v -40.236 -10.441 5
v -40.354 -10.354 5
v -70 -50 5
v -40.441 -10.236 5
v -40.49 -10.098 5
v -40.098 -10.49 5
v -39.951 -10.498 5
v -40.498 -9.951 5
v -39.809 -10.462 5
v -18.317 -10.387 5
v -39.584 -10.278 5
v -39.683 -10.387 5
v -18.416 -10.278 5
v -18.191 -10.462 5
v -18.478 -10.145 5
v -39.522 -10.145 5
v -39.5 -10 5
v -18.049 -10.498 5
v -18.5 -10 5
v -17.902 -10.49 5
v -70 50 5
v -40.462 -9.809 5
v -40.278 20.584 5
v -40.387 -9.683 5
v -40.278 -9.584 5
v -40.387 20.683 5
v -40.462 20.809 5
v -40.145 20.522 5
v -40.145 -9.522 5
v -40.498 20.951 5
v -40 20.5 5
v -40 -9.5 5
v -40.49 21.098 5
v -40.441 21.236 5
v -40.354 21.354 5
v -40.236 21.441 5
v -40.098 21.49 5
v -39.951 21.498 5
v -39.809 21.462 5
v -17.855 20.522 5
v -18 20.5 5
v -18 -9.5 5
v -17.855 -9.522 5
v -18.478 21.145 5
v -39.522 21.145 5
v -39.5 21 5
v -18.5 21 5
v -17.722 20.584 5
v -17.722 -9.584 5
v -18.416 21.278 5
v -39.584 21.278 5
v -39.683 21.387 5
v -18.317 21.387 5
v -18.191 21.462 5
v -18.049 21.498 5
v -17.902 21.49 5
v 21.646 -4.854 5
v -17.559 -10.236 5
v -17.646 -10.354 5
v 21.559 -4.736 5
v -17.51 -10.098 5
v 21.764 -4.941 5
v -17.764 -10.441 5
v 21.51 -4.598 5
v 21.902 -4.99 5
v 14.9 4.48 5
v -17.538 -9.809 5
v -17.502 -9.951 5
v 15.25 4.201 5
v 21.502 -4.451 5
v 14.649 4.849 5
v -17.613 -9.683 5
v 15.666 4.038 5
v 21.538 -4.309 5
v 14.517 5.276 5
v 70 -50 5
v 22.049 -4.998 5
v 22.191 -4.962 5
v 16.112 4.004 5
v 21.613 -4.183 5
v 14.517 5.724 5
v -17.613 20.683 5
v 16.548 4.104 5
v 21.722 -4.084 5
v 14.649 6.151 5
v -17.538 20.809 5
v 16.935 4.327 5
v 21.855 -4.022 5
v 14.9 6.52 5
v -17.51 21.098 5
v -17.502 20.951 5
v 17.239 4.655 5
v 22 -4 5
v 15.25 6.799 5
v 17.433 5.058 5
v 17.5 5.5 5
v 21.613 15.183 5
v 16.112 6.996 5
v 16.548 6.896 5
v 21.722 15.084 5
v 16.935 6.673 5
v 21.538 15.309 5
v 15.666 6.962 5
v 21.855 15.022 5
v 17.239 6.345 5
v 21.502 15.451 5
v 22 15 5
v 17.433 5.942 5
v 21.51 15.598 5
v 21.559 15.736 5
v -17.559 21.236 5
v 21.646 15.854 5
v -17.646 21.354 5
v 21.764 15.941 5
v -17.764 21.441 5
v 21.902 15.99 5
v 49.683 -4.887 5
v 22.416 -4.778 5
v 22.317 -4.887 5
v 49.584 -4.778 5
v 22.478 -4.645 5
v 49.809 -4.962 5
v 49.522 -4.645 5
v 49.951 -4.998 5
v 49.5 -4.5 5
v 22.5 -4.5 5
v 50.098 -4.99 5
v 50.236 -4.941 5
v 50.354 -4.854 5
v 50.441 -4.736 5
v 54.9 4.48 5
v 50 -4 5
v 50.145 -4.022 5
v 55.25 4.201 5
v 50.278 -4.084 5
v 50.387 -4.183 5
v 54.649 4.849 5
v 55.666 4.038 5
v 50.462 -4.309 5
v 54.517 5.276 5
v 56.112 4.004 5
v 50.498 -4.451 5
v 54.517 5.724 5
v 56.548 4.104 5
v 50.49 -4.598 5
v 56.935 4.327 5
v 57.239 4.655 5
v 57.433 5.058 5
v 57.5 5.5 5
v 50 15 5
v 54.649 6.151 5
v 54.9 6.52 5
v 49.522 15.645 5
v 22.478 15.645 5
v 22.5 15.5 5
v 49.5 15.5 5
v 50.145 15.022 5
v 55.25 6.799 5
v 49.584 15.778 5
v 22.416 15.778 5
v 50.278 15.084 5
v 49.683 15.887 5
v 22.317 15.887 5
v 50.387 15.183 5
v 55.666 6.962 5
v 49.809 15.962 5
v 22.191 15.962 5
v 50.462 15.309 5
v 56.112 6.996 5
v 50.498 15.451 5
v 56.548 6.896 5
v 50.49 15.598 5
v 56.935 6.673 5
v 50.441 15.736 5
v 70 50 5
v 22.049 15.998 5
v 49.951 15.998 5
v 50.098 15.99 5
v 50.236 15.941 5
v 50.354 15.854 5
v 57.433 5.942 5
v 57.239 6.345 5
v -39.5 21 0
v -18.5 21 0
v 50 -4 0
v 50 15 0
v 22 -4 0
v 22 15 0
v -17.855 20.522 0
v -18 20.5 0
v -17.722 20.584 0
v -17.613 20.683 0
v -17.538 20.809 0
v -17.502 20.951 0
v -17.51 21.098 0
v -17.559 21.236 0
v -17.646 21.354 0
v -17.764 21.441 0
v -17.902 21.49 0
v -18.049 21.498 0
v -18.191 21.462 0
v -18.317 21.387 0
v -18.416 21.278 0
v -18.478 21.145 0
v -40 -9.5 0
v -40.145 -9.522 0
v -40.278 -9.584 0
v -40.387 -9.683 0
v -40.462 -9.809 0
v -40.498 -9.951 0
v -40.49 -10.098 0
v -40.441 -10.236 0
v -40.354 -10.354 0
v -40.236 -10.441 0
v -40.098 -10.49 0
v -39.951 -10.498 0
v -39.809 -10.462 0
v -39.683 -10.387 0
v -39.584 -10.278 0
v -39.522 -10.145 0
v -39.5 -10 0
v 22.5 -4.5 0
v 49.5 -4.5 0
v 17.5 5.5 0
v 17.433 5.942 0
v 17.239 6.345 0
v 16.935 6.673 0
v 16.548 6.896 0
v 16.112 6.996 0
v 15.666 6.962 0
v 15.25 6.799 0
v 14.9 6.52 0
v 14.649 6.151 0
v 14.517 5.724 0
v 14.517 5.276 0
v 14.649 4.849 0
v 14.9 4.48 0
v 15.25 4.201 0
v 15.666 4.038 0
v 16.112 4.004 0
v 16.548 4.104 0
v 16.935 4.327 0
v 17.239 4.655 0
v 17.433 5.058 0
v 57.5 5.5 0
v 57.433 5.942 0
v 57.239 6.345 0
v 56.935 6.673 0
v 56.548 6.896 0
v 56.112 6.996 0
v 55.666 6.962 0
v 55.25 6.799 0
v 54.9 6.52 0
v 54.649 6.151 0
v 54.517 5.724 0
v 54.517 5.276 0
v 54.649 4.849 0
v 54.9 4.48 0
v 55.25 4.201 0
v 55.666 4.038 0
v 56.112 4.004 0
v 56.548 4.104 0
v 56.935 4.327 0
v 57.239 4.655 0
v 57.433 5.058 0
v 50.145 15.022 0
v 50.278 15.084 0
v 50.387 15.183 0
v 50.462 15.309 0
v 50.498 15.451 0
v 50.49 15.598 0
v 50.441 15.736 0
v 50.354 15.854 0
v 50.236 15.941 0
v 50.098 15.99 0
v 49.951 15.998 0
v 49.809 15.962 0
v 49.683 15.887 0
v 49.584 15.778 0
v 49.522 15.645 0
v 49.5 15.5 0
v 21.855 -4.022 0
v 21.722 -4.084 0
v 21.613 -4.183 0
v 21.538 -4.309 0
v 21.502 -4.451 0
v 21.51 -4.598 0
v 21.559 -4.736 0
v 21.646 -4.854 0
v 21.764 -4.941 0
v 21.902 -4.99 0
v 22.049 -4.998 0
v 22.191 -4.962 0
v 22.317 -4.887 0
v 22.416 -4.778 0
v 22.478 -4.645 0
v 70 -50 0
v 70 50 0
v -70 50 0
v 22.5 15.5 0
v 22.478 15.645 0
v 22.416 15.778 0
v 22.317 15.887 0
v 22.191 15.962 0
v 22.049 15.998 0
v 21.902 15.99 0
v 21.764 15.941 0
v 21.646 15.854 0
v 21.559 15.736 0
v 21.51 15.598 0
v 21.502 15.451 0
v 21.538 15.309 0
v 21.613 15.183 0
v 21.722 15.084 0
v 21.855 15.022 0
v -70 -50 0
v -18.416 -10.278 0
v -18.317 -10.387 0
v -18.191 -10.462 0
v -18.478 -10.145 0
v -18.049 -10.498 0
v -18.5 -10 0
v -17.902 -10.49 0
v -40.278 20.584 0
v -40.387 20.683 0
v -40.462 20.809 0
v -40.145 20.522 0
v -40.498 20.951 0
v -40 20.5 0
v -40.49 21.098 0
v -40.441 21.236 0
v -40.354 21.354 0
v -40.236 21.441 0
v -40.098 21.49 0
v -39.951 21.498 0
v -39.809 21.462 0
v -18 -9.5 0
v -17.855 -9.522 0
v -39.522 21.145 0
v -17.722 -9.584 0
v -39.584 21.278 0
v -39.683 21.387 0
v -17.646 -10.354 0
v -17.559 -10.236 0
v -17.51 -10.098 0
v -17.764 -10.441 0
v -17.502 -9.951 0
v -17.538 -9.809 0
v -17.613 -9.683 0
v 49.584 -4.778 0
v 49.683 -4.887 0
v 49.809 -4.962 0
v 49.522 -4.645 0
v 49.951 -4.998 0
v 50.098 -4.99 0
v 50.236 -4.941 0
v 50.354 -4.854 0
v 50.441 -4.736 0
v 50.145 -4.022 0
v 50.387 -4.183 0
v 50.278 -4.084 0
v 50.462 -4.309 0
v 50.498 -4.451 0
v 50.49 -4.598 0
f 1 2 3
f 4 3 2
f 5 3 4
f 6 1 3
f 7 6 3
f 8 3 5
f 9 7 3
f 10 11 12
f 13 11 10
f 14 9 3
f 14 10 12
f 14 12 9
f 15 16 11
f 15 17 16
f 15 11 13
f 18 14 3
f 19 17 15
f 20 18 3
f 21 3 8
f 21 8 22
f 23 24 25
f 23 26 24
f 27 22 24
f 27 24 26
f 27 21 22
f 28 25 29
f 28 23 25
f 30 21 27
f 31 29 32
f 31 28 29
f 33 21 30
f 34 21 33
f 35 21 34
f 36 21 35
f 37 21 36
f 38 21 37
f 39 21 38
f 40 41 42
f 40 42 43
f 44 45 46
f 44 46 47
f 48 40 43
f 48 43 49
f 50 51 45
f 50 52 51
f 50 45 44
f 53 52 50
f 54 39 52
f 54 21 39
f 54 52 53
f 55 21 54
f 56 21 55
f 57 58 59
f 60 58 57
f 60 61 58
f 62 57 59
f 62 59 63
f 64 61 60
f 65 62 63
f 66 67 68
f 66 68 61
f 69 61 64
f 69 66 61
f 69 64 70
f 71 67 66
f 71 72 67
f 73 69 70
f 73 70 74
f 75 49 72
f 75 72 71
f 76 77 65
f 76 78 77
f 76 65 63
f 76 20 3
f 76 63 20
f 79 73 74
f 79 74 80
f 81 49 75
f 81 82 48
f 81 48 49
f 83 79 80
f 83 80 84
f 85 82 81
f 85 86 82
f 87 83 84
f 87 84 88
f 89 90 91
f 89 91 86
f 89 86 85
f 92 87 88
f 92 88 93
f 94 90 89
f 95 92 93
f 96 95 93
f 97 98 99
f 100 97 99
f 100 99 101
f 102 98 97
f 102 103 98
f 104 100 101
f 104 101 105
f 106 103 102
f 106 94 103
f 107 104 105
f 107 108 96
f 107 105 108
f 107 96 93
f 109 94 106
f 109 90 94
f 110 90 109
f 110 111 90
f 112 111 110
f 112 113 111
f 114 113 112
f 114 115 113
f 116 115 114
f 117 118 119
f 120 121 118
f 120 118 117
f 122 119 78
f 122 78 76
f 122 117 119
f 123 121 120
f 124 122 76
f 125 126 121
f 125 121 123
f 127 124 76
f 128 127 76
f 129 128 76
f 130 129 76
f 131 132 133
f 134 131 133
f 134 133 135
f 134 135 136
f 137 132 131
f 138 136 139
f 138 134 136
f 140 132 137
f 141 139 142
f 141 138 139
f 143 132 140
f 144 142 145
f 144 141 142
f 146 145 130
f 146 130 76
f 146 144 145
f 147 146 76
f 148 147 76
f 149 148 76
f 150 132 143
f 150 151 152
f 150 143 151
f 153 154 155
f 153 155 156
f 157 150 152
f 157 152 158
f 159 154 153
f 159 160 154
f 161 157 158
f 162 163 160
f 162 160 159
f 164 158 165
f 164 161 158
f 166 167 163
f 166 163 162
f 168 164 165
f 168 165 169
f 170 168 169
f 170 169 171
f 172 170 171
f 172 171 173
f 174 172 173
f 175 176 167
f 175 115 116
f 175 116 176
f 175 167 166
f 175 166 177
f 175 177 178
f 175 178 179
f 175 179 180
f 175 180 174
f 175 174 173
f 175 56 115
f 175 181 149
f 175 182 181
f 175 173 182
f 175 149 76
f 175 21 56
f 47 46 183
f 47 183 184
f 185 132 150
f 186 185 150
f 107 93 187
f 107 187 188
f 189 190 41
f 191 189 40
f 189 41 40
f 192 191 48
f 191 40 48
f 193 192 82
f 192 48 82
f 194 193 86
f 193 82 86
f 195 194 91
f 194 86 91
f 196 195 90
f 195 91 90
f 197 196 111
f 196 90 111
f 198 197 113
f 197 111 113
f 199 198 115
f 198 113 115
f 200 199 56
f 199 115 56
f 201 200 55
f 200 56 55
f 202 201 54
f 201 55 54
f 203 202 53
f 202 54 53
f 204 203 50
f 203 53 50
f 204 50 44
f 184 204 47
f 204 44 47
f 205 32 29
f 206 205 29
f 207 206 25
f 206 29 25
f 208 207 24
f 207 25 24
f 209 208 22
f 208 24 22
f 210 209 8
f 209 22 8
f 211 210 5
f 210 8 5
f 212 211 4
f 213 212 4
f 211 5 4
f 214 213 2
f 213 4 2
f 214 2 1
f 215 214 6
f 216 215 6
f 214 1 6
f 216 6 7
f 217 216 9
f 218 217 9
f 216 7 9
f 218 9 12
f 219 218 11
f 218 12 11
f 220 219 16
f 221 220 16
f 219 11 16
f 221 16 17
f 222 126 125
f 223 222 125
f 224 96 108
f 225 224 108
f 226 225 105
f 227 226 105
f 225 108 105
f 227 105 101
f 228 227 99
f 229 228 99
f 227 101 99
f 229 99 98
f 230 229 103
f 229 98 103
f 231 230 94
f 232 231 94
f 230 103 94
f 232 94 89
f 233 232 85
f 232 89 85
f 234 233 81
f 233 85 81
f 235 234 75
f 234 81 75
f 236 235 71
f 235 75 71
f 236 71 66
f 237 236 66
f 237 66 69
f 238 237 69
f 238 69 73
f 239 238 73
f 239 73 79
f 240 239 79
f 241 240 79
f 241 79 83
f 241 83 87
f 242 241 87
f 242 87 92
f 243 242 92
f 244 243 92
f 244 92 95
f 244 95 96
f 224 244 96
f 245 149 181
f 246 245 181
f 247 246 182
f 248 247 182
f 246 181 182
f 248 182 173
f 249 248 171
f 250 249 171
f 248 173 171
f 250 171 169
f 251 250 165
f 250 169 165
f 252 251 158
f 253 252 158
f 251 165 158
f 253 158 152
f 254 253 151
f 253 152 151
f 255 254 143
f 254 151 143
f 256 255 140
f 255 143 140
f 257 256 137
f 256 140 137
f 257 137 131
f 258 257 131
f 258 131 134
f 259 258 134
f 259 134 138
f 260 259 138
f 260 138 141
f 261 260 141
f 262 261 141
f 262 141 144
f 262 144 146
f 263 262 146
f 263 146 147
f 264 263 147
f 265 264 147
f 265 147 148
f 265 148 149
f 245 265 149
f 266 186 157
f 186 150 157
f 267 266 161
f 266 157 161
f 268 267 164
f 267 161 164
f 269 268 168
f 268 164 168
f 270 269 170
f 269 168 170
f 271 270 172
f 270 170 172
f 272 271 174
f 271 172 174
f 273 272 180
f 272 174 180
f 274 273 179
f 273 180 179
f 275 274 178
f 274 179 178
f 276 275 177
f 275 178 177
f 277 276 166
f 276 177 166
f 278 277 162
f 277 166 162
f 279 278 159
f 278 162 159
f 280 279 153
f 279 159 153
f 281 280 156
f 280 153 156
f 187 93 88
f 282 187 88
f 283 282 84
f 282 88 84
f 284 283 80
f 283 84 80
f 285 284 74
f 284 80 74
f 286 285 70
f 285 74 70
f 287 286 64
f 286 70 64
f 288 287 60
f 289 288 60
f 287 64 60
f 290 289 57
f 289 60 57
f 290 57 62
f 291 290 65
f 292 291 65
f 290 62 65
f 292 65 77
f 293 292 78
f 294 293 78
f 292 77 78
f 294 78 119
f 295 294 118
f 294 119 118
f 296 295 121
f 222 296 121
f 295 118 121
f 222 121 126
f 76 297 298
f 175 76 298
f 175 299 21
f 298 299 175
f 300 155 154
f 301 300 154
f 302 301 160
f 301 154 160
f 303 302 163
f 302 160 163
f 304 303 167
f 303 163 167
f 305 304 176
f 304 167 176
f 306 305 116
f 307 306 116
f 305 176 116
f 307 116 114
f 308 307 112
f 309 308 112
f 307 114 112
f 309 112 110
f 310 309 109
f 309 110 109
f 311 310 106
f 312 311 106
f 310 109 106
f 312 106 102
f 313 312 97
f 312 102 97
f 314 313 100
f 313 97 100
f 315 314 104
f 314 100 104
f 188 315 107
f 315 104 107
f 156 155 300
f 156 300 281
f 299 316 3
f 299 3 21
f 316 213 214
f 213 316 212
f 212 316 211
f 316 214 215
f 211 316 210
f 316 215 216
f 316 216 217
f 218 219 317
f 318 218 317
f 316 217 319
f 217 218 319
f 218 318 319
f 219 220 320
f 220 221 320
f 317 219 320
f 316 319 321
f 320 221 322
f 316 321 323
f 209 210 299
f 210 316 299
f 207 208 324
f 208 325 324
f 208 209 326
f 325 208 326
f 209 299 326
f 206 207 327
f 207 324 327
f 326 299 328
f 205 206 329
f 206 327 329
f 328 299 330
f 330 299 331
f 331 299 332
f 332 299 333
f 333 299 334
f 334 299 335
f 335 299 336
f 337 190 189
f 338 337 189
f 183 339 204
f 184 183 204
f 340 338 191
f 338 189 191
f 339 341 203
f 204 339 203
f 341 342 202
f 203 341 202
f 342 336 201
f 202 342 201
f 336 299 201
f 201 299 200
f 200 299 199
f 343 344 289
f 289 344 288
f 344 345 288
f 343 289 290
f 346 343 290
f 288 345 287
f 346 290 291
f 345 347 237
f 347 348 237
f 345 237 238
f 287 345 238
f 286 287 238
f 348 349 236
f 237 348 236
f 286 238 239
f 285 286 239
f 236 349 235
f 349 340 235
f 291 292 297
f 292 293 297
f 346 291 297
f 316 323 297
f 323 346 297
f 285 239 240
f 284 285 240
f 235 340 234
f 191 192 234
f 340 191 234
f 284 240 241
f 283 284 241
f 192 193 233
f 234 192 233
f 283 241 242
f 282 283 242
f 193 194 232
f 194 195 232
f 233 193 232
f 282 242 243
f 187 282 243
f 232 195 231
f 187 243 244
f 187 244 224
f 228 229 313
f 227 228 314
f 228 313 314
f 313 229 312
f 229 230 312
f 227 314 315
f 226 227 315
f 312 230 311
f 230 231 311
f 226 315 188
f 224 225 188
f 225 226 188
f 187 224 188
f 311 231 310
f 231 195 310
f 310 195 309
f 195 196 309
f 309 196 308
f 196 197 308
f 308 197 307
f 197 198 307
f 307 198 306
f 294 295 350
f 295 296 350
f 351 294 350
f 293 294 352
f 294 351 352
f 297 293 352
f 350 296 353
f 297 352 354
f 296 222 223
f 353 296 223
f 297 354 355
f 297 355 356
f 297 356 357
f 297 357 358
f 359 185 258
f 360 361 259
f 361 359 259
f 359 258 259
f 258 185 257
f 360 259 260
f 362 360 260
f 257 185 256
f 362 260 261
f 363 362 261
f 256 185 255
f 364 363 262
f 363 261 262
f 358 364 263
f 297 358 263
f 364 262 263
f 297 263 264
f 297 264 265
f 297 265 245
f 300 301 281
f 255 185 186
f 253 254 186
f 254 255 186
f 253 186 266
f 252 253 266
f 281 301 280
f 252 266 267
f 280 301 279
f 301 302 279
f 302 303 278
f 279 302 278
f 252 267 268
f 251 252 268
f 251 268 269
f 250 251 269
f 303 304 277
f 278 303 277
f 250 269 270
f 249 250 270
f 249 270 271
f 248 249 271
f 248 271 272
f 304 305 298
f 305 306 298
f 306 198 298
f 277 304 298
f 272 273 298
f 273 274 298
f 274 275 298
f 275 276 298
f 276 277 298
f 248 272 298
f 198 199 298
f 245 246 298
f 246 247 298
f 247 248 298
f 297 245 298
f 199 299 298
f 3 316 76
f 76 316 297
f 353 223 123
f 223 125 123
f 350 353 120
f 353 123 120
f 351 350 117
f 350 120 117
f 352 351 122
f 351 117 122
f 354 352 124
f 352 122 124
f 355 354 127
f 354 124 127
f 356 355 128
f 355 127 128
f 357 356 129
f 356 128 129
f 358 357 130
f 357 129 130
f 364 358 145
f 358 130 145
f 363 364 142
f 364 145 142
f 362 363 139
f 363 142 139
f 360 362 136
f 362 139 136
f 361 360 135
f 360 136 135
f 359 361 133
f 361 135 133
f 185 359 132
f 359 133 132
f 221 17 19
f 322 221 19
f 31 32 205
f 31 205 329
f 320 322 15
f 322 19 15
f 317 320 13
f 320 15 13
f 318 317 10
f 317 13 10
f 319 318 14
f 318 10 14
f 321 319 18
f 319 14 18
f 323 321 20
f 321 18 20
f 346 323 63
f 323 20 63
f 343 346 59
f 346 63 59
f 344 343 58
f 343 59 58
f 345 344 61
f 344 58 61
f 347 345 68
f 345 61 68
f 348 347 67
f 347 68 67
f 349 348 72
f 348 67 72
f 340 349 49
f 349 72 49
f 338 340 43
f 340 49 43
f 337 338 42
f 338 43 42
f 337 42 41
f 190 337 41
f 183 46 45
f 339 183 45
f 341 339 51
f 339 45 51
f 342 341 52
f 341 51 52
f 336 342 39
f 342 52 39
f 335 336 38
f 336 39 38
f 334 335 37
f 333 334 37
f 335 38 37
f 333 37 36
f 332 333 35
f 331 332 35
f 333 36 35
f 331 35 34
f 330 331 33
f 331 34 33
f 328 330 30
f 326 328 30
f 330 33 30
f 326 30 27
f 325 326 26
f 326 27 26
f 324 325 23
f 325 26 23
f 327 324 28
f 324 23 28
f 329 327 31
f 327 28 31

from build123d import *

# Parameters (mm, degrees)
SKIZZE1_W                       = 140
SKIZZE1_H                       = 100
AUFSATZ_LINEAR_AUSTRAGEN1_DEPTH = 5
SKIZZE2_W                       = 22
SKIZZE2_H                       = 31
SCHNITT_LINEAR_AUSTRAGEN1_DEPTH = 87.168439698
SKIZZE4_R                       = 1.5
SKIZZE4_W                       = 28
SKIZZE4_H                       = 20
SCHNITT_LINEAR_AUSTRAGEN3_DEPTH = 87.168439698
SKIZZE3_R                       = 0.5
SCHNITT_LINEAR_AUSTRAGEN2_DEPTH = 87.168439698


with BuildPart() as part:
    # Skizze1 → Aufsatz-Linear austragen1 (new body)
    with BuildSketch(Plane.XY):
        Rectangle(SKIZZE1_W, SKIZZE1_H)
    extrude(amount=AUFSATZ_LINEAR_AUSTRAGEN1_DEPTH)

    # Skizze2 → Schnitt-Linear austragen1 (cut, through all)
    with BuildSketch(Plane.XY.offset(5)):
        with Locations((-29, 5.5)):
            Rectangle(SKIZZE2_W, SKIZZE2_H)
    extrude(amount=-SCHNITT_LINEAR_AUSTRAGEN1_DEPTH, mode=Mode.SUBTRACT)

    # Skizze4 → Schnitt-Linear austragen3 (cut, through all)
    with BuildSketch(Plane.XY.offset(5)):
        with Locations((16, 5.5)):
            Circle(SKIZZE4_R)
        with Locations((56, 5.5)):
            Circle(SKIZZE4_R)
        with Locations((36, 5.5)):
            Rectangle(SKIZZE4_W, SKIZZE4_H)
    extrude(amount=-SCHNITT_LINEAR_AUSTRAGEN3_DEPTH, mode=Mode.SUBTRACT)

    # Skizze3 → Schnitt-Linear austragen2 (cut, through all)
    with BuildSketch(Plane.XY.offset(5)):
        with Locations((-40, 21)):
            Circle(SKIZZE3_R)
        with Locations((-18, 21)):
            Circle(SKIZZE3_R)
        with Locations((-18, -10)):
            Circle(SKIZZE3_R)
        with Locations((-40, -10)):
            Circle(SKIZZE3_R)
        with Locations((22, 15.5)):
            Circle(SKIZZE3_R)
        with Locations((50, 15.5)):
            Circle(SKIZZE3_R)
        with Locations((50, -4.5)):
            Circle(SKIZZE3_R)
        with Locations((22, -4.5)):
            Circle(SKIZZE3_R)
    extrude(amount=-SCHNITT_LINEAR_AUSTRAGEN2_DEPTH, mode=Mode.SUBTRACT)


solid = part.part
